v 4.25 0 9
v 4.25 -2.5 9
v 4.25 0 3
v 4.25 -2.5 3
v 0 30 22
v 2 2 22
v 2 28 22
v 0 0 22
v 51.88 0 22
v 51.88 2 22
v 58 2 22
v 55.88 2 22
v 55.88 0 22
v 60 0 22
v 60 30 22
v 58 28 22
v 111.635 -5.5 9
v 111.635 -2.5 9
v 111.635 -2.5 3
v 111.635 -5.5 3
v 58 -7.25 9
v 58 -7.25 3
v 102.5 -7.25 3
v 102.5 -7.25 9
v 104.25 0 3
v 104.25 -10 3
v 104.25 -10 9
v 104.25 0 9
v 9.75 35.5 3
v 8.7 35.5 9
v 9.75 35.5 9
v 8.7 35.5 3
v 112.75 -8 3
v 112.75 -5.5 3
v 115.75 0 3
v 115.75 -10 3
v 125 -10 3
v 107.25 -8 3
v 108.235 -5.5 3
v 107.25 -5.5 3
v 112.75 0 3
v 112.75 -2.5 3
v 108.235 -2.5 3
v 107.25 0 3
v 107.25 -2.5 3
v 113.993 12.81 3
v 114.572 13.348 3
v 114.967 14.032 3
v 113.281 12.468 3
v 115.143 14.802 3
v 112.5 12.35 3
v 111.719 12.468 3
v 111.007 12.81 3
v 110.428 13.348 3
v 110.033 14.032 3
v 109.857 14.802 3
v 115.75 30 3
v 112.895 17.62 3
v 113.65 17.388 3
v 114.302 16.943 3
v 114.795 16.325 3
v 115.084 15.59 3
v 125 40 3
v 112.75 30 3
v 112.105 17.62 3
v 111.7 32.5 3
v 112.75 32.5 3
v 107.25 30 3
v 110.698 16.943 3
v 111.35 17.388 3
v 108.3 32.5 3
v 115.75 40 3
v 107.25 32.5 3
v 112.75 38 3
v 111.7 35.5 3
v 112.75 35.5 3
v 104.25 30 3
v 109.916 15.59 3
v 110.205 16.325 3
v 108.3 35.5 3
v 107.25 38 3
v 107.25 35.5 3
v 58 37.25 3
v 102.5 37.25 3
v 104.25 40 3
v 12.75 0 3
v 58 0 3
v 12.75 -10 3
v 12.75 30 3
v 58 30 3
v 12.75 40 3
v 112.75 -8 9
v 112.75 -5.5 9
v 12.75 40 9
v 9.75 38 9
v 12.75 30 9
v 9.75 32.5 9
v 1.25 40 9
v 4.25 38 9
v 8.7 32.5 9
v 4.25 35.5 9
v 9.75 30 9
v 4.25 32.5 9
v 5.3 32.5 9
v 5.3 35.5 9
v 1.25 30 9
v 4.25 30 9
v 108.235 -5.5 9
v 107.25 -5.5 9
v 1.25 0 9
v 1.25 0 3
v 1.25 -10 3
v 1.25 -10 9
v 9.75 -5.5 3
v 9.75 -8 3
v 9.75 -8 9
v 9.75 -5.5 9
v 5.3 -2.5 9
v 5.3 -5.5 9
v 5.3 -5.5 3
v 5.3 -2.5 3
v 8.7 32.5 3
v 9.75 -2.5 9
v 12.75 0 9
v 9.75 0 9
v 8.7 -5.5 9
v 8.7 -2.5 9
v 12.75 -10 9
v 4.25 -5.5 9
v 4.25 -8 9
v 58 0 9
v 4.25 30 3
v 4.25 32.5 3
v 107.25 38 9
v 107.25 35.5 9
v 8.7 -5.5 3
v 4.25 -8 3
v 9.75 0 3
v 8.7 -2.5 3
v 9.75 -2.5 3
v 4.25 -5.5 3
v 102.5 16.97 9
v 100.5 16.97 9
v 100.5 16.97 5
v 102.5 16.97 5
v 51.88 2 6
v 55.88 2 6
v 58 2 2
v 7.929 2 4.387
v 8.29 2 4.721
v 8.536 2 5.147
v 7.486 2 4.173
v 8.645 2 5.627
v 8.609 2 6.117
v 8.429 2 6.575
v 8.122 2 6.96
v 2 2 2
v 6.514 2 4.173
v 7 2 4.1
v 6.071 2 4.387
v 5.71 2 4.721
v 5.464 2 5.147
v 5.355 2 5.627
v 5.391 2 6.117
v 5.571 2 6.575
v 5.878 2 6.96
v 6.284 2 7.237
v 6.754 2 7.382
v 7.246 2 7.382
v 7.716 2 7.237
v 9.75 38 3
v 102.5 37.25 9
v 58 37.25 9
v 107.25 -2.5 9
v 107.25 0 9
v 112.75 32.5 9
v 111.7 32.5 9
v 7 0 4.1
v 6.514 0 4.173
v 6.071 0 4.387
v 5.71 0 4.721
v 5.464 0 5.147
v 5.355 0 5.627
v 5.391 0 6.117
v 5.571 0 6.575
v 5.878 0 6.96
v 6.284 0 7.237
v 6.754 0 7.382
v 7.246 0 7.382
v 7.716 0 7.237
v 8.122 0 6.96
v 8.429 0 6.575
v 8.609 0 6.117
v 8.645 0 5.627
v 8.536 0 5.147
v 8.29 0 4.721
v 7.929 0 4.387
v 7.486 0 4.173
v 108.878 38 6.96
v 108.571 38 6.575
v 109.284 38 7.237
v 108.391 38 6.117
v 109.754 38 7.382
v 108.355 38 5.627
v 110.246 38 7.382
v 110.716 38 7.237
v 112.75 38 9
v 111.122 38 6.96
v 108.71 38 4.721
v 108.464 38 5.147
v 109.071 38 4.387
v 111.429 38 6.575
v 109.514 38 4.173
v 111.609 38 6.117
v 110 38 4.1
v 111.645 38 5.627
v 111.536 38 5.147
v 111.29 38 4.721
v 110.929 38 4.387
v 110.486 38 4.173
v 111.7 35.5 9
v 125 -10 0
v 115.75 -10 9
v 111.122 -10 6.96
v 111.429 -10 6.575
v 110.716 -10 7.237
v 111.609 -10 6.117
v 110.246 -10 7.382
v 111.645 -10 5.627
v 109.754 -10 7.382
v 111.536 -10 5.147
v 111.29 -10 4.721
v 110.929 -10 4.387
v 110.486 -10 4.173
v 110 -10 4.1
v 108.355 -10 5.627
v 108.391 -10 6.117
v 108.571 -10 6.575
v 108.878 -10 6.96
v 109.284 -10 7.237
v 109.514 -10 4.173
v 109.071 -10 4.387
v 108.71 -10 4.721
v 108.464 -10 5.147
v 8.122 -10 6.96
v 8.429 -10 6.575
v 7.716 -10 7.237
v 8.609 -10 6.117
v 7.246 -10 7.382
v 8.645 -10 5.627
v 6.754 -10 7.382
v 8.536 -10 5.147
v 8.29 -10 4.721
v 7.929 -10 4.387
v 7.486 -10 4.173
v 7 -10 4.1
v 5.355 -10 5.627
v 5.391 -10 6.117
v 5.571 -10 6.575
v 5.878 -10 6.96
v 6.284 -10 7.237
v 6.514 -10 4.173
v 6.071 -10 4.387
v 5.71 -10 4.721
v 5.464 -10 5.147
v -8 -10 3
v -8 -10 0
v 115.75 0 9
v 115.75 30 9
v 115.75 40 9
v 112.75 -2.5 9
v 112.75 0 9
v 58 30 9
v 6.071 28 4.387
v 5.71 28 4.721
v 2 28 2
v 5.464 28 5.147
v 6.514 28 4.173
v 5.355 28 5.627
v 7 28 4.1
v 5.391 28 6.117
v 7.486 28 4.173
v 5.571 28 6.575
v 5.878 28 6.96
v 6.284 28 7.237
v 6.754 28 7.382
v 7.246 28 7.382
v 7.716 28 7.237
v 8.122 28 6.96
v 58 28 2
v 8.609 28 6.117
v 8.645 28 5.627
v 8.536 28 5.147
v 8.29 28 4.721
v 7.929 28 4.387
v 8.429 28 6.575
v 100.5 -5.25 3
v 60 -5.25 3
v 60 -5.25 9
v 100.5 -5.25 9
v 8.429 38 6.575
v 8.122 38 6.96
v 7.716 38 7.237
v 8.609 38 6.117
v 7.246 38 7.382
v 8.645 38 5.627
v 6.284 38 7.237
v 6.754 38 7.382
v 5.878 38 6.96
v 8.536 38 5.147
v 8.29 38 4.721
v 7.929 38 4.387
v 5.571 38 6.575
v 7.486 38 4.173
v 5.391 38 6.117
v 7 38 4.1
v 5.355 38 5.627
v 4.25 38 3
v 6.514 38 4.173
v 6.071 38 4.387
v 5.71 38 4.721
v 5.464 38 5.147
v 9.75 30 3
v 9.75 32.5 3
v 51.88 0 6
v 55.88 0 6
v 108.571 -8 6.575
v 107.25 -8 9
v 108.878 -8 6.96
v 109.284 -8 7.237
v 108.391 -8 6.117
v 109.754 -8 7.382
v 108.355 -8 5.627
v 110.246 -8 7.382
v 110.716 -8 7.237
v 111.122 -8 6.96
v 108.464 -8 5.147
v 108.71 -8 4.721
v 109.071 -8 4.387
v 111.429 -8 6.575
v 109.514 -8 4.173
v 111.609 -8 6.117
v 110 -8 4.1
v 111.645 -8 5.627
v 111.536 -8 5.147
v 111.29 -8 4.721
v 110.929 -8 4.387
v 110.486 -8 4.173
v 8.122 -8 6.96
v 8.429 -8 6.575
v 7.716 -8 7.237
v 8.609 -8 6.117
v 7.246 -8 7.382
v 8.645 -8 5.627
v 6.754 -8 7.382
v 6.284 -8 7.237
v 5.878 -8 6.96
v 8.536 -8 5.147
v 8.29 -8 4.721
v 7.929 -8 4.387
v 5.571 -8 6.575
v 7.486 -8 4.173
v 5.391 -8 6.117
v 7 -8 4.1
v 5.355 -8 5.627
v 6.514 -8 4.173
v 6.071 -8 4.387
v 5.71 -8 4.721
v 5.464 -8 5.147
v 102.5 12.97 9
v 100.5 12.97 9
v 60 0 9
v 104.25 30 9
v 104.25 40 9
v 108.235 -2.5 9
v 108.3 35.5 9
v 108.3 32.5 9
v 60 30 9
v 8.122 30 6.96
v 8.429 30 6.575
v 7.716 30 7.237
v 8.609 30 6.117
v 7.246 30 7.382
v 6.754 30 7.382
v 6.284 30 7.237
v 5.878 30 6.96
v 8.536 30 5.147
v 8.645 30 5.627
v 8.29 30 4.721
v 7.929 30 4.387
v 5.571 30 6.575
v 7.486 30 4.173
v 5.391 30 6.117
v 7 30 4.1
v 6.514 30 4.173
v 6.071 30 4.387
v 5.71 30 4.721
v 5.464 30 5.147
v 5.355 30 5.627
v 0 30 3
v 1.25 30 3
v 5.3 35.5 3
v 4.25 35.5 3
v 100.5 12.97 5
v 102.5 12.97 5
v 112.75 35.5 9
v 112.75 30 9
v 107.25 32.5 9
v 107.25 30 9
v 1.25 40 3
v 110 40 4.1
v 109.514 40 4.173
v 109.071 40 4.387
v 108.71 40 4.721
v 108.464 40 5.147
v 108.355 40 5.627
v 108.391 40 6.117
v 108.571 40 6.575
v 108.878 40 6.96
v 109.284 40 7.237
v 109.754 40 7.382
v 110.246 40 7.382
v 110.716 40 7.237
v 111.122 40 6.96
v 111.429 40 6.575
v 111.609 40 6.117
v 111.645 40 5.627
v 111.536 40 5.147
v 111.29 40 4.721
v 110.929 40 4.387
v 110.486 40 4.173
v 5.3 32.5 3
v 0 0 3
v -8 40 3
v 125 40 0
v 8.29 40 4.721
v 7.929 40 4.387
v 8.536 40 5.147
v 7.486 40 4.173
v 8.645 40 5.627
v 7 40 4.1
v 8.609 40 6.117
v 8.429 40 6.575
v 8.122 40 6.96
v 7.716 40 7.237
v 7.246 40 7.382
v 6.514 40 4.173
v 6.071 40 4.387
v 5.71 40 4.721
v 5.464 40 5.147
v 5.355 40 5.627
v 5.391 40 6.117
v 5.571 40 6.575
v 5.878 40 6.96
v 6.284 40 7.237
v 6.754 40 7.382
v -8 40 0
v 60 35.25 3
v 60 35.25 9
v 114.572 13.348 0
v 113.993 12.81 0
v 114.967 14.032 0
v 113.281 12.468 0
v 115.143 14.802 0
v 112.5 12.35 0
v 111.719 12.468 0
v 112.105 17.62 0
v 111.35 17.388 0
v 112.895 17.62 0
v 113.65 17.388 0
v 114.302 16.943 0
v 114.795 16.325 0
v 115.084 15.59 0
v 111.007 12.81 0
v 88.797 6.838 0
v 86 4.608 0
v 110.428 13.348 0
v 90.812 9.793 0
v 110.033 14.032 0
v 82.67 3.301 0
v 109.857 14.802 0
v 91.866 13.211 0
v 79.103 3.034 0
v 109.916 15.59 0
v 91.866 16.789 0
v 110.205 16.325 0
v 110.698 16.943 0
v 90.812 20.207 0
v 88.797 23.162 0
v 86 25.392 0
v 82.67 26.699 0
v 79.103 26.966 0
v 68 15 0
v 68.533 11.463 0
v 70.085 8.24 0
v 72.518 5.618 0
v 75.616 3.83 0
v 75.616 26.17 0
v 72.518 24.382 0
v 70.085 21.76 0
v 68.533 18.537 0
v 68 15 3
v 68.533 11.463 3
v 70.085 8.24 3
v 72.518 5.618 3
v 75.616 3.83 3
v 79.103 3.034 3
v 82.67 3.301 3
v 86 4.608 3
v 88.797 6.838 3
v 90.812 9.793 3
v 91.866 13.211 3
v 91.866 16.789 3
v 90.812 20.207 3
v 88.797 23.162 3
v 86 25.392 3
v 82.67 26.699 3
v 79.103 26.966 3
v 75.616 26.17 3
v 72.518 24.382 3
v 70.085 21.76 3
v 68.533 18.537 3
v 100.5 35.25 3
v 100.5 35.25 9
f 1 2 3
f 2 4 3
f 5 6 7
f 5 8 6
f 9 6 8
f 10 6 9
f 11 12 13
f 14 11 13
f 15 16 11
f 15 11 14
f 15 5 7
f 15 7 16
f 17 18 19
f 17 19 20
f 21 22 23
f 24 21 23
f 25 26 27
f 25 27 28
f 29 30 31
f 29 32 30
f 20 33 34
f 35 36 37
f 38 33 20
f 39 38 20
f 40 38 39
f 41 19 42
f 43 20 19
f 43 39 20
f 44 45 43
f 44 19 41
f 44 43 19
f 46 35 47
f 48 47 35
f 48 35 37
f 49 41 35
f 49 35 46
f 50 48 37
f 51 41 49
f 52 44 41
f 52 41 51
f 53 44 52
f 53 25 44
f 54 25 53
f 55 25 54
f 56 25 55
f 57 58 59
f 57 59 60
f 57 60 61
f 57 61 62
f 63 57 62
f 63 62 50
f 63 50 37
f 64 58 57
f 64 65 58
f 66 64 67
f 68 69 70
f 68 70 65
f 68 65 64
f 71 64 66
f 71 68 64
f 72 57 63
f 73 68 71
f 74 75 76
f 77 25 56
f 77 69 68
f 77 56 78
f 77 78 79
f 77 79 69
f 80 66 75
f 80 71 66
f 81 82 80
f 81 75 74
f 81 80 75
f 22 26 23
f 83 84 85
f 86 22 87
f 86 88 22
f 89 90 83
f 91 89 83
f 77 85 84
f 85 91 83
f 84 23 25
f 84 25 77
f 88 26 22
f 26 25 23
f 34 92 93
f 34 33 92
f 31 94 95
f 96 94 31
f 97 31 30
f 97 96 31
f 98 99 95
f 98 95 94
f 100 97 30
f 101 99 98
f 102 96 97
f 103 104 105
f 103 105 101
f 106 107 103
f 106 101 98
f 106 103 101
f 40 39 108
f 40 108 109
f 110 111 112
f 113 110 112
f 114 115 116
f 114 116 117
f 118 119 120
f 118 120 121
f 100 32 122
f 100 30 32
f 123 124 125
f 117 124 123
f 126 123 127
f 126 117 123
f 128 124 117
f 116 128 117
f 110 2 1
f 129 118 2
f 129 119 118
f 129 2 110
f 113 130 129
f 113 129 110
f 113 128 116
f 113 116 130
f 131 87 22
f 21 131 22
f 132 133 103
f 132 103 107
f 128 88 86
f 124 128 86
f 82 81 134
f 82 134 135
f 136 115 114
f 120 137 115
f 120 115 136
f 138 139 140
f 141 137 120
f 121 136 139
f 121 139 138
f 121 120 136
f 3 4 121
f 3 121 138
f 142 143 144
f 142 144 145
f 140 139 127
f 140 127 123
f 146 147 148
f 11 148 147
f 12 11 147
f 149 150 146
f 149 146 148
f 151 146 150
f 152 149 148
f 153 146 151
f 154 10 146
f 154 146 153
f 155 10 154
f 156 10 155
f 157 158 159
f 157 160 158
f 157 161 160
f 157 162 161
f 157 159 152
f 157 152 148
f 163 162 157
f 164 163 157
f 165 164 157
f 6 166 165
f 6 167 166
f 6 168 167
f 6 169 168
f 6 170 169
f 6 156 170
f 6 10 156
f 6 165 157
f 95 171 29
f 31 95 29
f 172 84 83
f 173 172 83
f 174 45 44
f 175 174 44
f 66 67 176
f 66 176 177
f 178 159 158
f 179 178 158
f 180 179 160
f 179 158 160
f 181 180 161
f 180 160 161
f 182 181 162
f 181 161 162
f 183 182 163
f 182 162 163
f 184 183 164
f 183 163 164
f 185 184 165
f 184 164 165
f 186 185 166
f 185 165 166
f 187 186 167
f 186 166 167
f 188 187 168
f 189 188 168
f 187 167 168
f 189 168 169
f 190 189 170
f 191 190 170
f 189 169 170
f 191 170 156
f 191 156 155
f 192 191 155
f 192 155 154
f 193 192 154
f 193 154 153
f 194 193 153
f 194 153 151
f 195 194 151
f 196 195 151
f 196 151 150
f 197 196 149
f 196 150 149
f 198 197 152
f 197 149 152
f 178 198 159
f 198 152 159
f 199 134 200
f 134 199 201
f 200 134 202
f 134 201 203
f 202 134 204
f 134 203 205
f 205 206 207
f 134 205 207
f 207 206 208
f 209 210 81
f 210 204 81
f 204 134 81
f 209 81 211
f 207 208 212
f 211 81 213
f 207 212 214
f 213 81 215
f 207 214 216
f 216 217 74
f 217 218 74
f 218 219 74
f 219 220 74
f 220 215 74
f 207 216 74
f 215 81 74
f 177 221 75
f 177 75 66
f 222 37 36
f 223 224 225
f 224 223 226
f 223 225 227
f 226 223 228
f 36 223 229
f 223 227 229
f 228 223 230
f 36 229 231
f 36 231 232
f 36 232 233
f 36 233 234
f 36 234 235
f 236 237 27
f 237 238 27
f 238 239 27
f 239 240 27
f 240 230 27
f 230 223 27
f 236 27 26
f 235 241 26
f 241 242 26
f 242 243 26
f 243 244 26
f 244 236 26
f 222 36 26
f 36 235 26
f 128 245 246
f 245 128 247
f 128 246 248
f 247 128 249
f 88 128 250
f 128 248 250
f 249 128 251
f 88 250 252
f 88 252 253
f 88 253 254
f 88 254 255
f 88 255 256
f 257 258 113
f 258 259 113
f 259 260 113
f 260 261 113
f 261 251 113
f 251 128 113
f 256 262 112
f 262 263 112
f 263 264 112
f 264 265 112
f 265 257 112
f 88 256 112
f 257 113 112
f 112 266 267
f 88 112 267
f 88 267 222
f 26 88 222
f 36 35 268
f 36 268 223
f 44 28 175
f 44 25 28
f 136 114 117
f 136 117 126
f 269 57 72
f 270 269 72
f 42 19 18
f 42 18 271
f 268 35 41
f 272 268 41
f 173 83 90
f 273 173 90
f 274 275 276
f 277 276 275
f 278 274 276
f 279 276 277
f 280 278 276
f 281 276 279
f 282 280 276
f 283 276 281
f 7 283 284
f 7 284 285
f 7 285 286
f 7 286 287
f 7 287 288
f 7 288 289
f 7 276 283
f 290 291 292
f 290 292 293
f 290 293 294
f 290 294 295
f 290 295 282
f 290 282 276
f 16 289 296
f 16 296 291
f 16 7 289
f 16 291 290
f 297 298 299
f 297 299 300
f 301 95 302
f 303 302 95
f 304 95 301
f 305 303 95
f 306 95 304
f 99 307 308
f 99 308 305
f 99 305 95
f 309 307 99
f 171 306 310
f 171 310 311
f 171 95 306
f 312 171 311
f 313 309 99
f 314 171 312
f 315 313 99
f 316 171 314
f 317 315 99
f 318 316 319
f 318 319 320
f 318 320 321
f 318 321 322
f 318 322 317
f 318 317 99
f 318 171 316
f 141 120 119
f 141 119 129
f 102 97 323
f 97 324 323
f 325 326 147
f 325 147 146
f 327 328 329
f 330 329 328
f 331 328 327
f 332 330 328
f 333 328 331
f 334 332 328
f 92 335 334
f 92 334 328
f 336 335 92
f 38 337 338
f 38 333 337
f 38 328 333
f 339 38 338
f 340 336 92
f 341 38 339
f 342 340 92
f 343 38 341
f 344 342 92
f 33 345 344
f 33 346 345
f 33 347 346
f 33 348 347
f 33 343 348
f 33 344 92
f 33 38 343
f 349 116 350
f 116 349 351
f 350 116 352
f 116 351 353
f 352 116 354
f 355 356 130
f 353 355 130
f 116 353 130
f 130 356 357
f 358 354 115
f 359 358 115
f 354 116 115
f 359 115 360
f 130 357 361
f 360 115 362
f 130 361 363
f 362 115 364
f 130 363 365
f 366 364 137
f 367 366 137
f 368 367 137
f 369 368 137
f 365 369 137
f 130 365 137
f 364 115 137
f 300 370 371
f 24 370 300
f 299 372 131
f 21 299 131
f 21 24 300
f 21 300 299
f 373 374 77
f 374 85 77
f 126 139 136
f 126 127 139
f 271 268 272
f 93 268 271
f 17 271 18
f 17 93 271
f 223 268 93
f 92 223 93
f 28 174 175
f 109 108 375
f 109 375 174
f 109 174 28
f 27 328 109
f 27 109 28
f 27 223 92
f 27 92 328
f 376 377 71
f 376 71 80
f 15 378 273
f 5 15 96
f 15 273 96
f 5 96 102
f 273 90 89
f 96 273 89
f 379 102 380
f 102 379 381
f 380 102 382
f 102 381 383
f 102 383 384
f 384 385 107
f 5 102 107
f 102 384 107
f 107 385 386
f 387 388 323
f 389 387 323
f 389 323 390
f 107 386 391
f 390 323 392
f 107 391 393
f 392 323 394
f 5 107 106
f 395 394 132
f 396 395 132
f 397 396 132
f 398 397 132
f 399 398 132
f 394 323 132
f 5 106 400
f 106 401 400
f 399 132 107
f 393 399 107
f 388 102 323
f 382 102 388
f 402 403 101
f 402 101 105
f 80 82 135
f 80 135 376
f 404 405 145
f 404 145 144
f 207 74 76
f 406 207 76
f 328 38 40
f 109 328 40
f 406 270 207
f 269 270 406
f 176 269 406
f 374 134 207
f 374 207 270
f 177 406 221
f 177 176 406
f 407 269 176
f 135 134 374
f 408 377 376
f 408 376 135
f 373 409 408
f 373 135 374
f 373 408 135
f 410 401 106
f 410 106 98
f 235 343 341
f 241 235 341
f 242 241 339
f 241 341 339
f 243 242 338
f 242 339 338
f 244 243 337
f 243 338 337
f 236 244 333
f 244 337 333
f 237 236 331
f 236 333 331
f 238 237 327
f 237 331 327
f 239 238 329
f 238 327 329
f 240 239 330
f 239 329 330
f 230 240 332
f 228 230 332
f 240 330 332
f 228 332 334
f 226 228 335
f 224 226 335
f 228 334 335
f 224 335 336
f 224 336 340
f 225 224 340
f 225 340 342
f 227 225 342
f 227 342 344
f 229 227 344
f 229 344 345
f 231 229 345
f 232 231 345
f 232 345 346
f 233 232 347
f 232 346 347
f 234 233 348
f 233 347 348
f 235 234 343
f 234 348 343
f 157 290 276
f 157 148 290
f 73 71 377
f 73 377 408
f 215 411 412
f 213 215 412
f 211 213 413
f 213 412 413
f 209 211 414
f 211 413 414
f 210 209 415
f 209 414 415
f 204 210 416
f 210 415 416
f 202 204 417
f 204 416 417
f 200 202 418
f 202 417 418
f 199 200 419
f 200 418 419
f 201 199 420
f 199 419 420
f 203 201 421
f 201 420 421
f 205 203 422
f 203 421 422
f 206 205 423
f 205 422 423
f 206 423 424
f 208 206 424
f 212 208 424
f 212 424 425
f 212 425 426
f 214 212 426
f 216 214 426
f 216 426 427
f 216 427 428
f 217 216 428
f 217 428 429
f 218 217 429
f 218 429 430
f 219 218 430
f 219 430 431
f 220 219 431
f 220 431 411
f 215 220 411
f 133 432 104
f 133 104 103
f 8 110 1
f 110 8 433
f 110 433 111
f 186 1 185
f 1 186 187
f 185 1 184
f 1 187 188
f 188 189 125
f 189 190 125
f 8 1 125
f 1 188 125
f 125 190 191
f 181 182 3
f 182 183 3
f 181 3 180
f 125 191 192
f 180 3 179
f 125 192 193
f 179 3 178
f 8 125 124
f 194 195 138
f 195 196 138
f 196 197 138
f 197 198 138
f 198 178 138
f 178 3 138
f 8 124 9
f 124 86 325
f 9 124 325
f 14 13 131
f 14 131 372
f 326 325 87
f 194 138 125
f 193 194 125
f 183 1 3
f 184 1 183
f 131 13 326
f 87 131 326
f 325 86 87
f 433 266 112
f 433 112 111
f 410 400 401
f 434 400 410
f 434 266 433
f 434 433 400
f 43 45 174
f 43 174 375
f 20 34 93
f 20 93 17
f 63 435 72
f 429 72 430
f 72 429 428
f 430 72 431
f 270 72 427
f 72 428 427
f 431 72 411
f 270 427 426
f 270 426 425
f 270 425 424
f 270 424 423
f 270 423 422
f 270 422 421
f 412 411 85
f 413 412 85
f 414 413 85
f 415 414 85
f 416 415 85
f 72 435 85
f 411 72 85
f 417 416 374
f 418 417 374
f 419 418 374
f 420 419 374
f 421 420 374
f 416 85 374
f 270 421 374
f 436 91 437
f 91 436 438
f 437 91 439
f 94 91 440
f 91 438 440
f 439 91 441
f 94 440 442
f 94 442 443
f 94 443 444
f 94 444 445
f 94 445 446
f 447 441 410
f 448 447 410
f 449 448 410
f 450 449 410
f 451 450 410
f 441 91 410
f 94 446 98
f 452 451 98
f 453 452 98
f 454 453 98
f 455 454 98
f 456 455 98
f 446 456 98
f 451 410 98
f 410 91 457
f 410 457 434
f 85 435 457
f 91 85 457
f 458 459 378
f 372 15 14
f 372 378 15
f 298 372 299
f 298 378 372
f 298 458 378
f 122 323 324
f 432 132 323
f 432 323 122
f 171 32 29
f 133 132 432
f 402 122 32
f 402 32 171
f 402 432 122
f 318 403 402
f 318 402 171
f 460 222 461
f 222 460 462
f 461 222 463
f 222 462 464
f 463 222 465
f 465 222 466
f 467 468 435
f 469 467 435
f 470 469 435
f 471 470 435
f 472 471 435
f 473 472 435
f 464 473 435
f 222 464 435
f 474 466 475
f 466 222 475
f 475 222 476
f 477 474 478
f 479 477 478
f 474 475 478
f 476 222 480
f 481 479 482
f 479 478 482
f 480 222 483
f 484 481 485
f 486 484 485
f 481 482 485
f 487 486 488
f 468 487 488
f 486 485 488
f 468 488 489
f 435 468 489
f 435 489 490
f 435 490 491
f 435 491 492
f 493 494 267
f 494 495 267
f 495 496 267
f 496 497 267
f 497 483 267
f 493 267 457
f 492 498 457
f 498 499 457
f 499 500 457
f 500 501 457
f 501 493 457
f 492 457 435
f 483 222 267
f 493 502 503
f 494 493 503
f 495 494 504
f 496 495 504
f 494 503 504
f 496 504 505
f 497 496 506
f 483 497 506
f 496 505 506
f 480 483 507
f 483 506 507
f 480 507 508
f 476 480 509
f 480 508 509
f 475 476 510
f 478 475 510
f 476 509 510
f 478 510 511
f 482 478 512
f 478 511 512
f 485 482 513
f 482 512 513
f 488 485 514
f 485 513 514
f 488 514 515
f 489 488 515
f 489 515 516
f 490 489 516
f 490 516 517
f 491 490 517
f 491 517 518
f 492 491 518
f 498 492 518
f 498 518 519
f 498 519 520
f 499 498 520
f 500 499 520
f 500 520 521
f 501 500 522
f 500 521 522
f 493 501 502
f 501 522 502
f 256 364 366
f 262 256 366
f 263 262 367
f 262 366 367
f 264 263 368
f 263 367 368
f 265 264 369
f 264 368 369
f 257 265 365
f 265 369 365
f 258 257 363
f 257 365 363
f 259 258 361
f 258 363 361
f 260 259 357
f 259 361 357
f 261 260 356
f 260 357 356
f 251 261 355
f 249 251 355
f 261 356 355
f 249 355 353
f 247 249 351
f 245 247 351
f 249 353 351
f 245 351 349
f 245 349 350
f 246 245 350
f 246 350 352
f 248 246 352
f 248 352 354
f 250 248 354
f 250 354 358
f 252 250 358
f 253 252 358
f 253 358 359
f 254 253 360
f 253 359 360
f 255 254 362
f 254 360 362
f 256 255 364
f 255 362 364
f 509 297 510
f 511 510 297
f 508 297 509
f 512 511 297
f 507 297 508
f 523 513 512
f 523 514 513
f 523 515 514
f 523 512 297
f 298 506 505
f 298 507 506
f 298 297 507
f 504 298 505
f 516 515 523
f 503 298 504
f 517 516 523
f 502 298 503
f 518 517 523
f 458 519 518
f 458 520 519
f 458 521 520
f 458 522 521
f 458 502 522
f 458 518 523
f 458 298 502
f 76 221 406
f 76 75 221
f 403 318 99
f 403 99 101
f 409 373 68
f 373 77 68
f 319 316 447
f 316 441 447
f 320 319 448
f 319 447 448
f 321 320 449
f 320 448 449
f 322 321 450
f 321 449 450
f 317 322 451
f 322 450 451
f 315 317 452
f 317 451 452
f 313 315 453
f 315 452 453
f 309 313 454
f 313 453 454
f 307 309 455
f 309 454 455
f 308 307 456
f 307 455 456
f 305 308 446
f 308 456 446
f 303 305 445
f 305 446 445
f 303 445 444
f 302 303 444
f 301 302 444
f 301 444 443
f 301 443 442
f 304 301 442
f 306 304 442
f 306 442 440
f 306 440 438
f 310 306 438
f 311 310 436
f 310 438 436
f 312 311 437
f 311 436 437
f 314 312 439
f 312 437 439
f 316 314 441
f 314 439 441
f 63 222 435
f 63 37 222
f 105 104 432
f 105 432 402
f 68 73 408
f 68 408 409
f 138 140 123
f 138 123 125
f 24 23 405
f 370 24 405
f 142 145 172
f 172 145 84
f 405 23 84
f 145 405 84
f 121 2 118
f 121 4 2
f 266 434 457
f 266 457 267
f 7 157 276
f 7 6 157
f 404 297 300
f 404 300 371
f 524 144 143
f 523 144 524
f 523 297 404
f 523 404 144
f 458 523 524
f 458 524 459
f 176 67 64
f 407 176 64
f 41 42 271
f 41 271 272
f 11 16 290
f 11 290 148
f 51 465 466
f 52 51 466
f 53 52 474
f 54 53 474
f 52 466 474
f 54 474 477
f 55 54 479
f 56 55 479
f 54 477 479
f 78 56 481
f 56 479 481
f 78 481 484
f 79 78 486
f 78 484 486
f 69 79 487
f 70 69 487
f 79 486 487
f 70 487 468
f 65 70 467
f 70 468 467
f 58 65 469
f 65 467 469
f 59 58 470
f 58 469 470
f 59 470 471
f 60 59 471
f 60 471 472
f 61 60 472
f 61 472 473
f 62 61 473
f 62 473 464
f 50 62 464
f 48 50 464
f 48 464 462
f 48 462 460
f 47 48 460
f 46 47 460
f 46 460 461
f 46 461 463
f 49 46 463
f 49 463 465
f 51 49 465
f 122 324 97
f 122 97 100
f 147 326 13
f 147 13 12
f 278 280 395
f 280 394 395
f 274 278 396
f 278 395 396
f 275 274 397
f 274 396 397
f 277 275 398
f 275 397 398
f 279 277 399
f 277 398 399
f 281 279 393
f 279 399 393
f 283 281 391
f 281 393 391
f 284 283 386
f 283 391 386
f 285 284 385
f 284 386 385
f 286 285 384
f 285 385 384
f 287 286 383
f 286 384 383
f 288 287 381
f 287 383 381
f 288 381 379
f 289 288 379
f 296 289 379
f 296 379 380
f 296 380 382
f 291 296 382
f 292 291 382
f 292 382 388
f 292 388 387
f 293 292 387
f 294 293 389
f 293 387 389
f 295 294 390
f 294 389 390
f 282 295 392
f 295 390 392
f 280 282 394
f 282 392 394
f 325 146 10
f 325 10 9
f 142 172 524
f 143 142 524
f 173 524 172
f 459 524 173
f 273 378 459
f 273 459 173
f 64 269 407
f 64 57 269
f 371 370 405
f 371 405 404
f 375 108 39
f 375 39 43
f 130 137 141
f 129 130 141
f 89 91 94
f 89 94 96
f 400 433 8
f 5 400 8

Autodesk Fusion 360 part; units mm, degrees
sketch "Sketch1" plane through (0, 0, 0) normal (0, 0, 1) x (1, 0, 0)
  line L0 (0, 0) -> (60, 0)
  line L1 (60, 0) -> (60, 30)
  line L2 (60, 30) -> (0, 30)
  line L3 (0, 30) -> (0, 0)
  dimension "d1" = 60
  dimension "d2" = 30
extrude "Extrude1" add sketch "Sketch1" along normal blind 22
sketch "Sketch2" plane through (0, 0, 22) normal (0, 0, 1) x (-1, 0, 0)
  line L0 (0, -30) -> (0, 0)
  line L1 (0, 0) -> (-60, 0)
  line L2 (-60, 0) -> (-60, -30)
  line L3 (-60, -30) -> (0, -30)
  line L4 (-2, -28) -> (-58, -28)
  line L5 (-58, -28) -> (-58, -2)
  line L6 (-58, -2) -> (-2, -2)
  line L7 (-2, -2) -> (-2, -28)
  dimension "d5" = 56
  dimension "d6" = 26
  dimension "d7" = 2
  dimension "d8" = 2
extrude "Extrude2" cut sketch "Sketch2" against normal blind 20 contours L4 L5 L6 L7
sketch "Sketch3" plane through (0, 0, 0) normal (0, -1, 0) x (1, 0, 0)
  line L0 (0, 0) -> (60, 0)
  line L1 (60, 0) -> (60, 22)
  line L2 (60, 22) -> (0, 22)
  line L3 (0, 22) -> (0, 0)
  line L4 (0, 0) -> (60, 0)
  line L5 (60, 0) -> (60, 3)
  line L6 (60, 3) -> (0, 3)
  line L7 (0, 3) -> (0, 0)
  dimension "d11" = 60
  dimension "d12" = 3
extrude "Extrude3" add sketch "Sketch3" along normal blind 8 contours L0 L1 L3 L4 L5 L6 L7
sketch "Sketch4" plane through (0, 30, 0) normal (0, 1, 0) x (-1, 0, 0)
  line L0 (-60, 0) -> (0, 0)
  line L1 (0, 0) -> (0, 22)
  line L2 (0, 22) -> (-60, 22)
  line L3 (-60, 22) -> (-60, 0)
  line L4 (-60, 0) -> (0, 0)
  line L5 (0, 0) -> (0, 3)
  line L6 (0, 3) -> (-60, 3)
  line L7 (-60, 3) -> (-60, 0)
  dimension "d15" = 3
extrude "Extrude4" add sketch "Sketch4" along normal blind 8 contours L0 L1 L3 L4 L5 L6 L7
sketch "Sketch5" plane through (60, 0, 0) normal (1, 0, 0) x (0, 1, 0)
  line L0 (-8, 0) -> (38, 0)
  line L1 (38, 0) -> (38, 3)
  line L2 (38, 3) -> (30, 3)
  line L3 (30, 3) -> (30, 22)
  line L4 (30, 22) -> (0, 22)
  line L5 (0, 22) -> (0, 3)
  line L6 (0, 3) -> (-8, 3)
  line L7 (-8, 3) -> (-8, 0)
  line L8 (-8, 3) -> (38, 3)
  line L9 (38, 3) -> (38, 0)
  line L10 (38, 0) -> (-8, 0)
  line L11 (-8, 0) -> (-8, 3)
extrude "Extrude5" add sketch "Sketch5" along normal blind 50 contours L0 L1 L2 L6 L7 L8 L9 L10 L11
sketch "Sketch6" plane through (0, 0, 0) normal (-1, 0, 0) x (0, -1, 0)
  line L0 (-38, 0) -> (8, 0)
  line L1 (8, 0) -> (8, 3)
  line L2 (8, 3) -> (0, 3)
  line L3 (0, 3) -> (0, 22)
  line L4 (0, 22) -> (-30, 22)
  line L5 (-30, 22) -> (-30, 3)
  line L6 (-30, 3) -> (-38, 3)
  line L7 (-38, 3) -> (-38, 0)
  line L8 (-38, 3) -> (8, 3)
  line L9 (8, 3) -> (8, 0)
  line L10 (8, 0) -> (-38, 0)
  line L11 (-38, 0) -> (-38, 3)
extrude "Extrude6" add sketch "Sketch6" along normal blind 8 contours L0 L1 L2 L6 L7 L8 L9 L10 L11
sketch "Sketch7" plane through (0, 0, 3) normal (0, 0, 1) x (-1, 0, 0)
  line L0 (8, 8) -> (-110, 8)
  line L1 (-110, 8) -> (-110, -38)
  line L2 (-110, -38) -> (8, -38)
  line L3 (8, -38) -> (8, 8)
  line L4 (0, 0) -> (0, -30)
  line L5 (0, -30) -> (-60, -30)
  line L6 (-60, -30) -> (-60, 0)
  line L7 (-60, 0) -> (0, 0)
  line L8 (-60.1, -35.15) -> (-100.4, -35.15) construction
  line L9 (-100.4, -35.15) -> (-100.4, 5.15) construction
  line L10 (-100.4, 5.15) -> (-60.1, 5.15) construction
  line L11 (-60.1, 5.15) -> (-60.1, -35.15) construction
  line L12 (-60, -15) -> (-127.1, -15) construction
  line L13 (-100.5, -35.25) -> (-60, -35.25)
  line L14 (-60, -35.25) -> (-60, 5.25)
  line L15 (-60, 5.25) -> (-100.5, 5.25)
  line L16 (-100.5, 5.25) -> (-100.5, -35.25)
  line L17 (-58, -37.25) -> (-58, 7.25)
  line L18 (-58, 7.25) -> (-102.5, 7.25)
  line L19 (-102.5, 7.25) -> (-102.5, -37.25)
  line L20 (-102.5, -37.25) -> (-58, -37.25)
  dimension "d22" = 40.3
  dimension "d23" = 40.3
  dimension "d24" = 20.15
  dimension "d25" = 0.1
  dimension "d31" = 40.5
  dimension "d32" = 40.5
  dimension "d33" = 68
  dimension "d34" = 20.25
  dimension "d35" = 2
move_face "OffsetFaces1" offset 2 1 faces at (70.6667, 38, 2)
extrude "Extrude7" add 1 faces at (31.3333, -8, 2) along direction (0, -1, 0) blind 2
extrude "Extrude8" add 1 faces at (110, 23.3333, 1) along direction (1, 0, 0) blind 15
extrude "Extrude9" add sketch "Sketch7" along normal blind 6 contours L5 L7 L13 L14 L15 L16 L17 L18 L19 L20
sketch "Sketch9" plane through (0, 0, 3) normal (0, 0, 1) x (-1, 0, 0)
  line L0 (-60, -35.25) -> (-60, 5.25)
  line L1 (-60, 5.25) -> (-100.5, 5.25)
  line L2 (-100.5, 5.25) -> (-100.5, -35.25)
  line L3 (-100.5, -35.25) -> (-60, -35.25)
  circle A0 centre (-80, -15) radius 12
  dimension "d38" = 24
extrude "Extrude10" cut sketch "Sketch9" against normal blind 12 contours A0
sketch "Sketch10" plane through (0, 0, 9) normal (0, 0, 1) x (-1, 0, 0)
  line L0 (-60, 0) -> (-58, 0)
  line L1 (-58, 0) -> (-58, 7.25)
  line L2 (-58, 7.25) -> (-102.5, 7.25)
  line L3 (-102.5, 7.25) -> (-102.5, -37.25)
  line L4 (-102.5, -37.25) -> (-58, -37.25)
  line L5 (-58, -37.25) -> (-58, -30)
  line L6 (-58, -30) -> (-60, -30)
  line L7 (-60, -30) -> (-60, -35.25)
  line L8 (-60, -35.25) -> (-100.5, -35.25)
  line L9 (-100.5, -35.25) -> (-100.5, 5.25)
  line L10 (-100.5, 5.25) -> (-60, 5.25)
  line L11 (-60, 5.25) -> (-60, 0)
  line L12 (-100.5, -16.9697) -> (-102.5, -16.9697)
  line L13 (-102.5, -16.9697) -> (-102.5, -12.9697)
  line L14 (-102.5, -12.9697) -> (-100.5, -12.9697)
  line L15 (-100.5, -12.9697) -> (-100.5, -16.9697)
  line L16 (-110, -14.9697) -> (-85, -14.9697) construction
  dimension "d41" = 2
  dimension "d42" = 4
  dimension "d43" = 2
extrude "Extrude11" cut sketch "Sketch10" against normal blind 4 contours L3 L9 L12 L13 L14 L15
sketch "Sketch11" plane through (0, 0, 22) normal (0, 0, 1) x (-1, 0, 0)
  line L0 (-58, -28) -> (-58, -2)
  line L1 (-58, -2) -> (-2, -2)
  line L2 (-2, -2) -> (-2, -28)
  line L3 (-2, -28) -> (-58, -28)
  line L4 (0, -30) -> (0, 0)
  line L5 (0, 0) -> (-60, 0)
  line L6 (-60, 0) -> (-60, -30)
  line L7 (-60, -30) -> (0, -30)
  line L8 (-55.8802, -2) -> (-51.8802, -2)
  line L9 (-51.8802, -2) -> (-51.8802, 0)
  line L10 (-51.8802, 0) -> (-55.8802, 0)
  line L11 (-55.8802, 0) -> (-55.8802, -2)
  dimension "d46" = 4
extrude "Extrude12" cut sketch "Sketch11" against normal blind 16 contours L1 L5 L8 L9 L10 L11
sketch "Sketch12" plane through (0, 0, 3) normal (0, 0, 1) x (-1, 0, 0)
  line L0 (-58, -30) -> (-58, -37.25)
  line L1 (-58, -37.25) -> (-102.5, -37.25)
  line L2 (-102.5, -37.25) -> (-102.5, 7.25)
  line L3 (-102.5, 7.25) -> (-58, 7.25)
  line L4 (-58, 7.25) -> (-58, 0)
  line L5 (-58, 0) -> (0, 0)
  line L6 (0, 0) -> (0, -30)
  line L7 (0, -30) -> (-58, -30)
  line L8 (-125, -40) -> (8, -40)
  line L9 (8, -40) -> (8, 10)
  line L10 (8, 10) -> (-125, 10)
  line L11 (-125, 10) -> (-125, -40)
  line L12 (-7, -44) -> (-7, 24) construction
  line L13 (-110, -45) -> (-110, 22) construction
  line L14 (-1.25, -30) -> (-1.25, -40)
  line L15 (-1.25, -40) -> (-12.75, -40)
  line L16 (-12.75, -40) -> (-12.75, -30)
  line L17 (-12.75, -30) -> (-9.75, -30)
  line L18 (-9.75, -38) -> (-4.25, -38)
  line L19 (-4.25, -38) -> (-4.25, -30)
  line L20 (-1.25, -30) -> (-4.25, -30)
  line L21 (-9.75, -38) -> (-9.75, -30)
  line L22 (-28.0187, -15) -> (31, -15) construction
  line L23 (-12.75, 0) -> (-9.75, 0)
  line L24 (-12.75, 10) -> (-12.75, 0)
  line L25 (-9.75, 8) -> (-9.75, 0)
  line L26 (-9.75, 8) -> (-4.25, 8)
  line L27 (-4.25, 8) -> (-4.25, 0)
  line L28 (-1.25, 0) -> (-4.25, 0)
  line L29 (-1.25, 0) -> (-1.25, 10)
  line L30 (-1.25, 10) -> (-12.75, 10)
  line L31 (-58.5, 15) -> (-58.5, -52) construction
  line L32 (-104.25, 10) -> (-104.25, 0)
  line L33 (-115.75, 10) -> (-104.25, 10)
  line L34 (-107.25, 8) -> (-112.75, 8)
  line L35 (-107.25, 8) -> (-107.25, 0)
  line L36 (-112.75, 8) -> (-112.75, 0)
  line L37 (-115.75, 0) -> (-115.75, 10)
  line L38 (-115.75, 0) -> (-112.75, 0)
  line L39 (-104.25, 0) -> (-107.25, 0)
  line L40 (-104.25, -30) -> (-107.25, -30)
  line L41 (-107.25, -38) -> (-107.25, -30)
  line L42 (-112.75, -38) -> (-112.75, -30)
  line L43 (-115.75, -30) -> (-112.75, -30)
  line L44 (-115.75, -30) -> (-115.75, -40)
  line L45 (-107.25, -38) -> (-112.75, -38)
  line L46 (-115.75, -40) -> (-104.25, -40)
  line L47 (-104.25, -40) -> (-104.25, -30)
  dimension "d49" = 15
  dimension "d50" = 15
  dimension "d51" = 2.75
  dimension "d52" = 2.75
  dimension "d53" = 3
  dimension "d54" = 3
  dimension "d55" = 2
  dimension "d56" = 66.5
extrude "Extrude13" add sketch "Sketch12" along normal blind 6 contours L7 L8 L14 L15 L16 L17 L18 L19 L20 L21 | L8 L40 L41 L42 L43 L44 L45 L46 L47 | L5 L10 L23 L24 L25 L26 L27 L28 L29 L30 | L10 L32 L33 L34 L35 L36 L37 L38 L39
sketch "Sketch13" plane through (0, -10, 0) normal (0, -1, 0) x (1, 0, 0)
  line L0 (-8, 0) -> (125, 0)
  line L1 (125, 0) -> (125, 3)
  line L2 (125, 3) -> (115.75, 3)
  line L3 (115.75, 3) -> (115.75, 9)
  line L4 (115.75, 9) -> (104.25, 9)
  line L5 (104.25, 9) -> (104.25, 3)
  line L6 (104.25, 3) -> (12.75, 3)
  line L7 (12.75, 3) -> (12.75, 9)
  line L8 (12.75, 9) -> (1.25, 9)
  line L9 (1.25, 9) -> (1.25, 3)
  line L10 (1.25, 3) -> (-8, 3)
  line L11 (-8, 3) -> (-8, 0)
  line L12 (104.25, 3) -> (115.75, 3) construction
  line L13 (103, 8.5) -> (117.6026, 8.5) construction
  line L14 (104.25, 8.5) -> (115.75, 3) construction
  line L15 (115.75, 8.5) -> (104.25, 3) construction
  line L16 (1.25, 3) -> (12.75, 3) construction
  line L17 (-3, 8.5) -> (20, 8.5) construction
  line L18 (1.25, 8.5) -> (12.75, 3) construction
  line L19 (12.75, 8.5) -> (1.25, 3) construction
  point P0 (110, 5.75)
  point P1 (7, 5.75)
  dimension "d59" = 5.5
  dimension "d60" = 5.5
hole "Hole1" at (7, -10, 5.75) at (110, -10, 5.75) direction (0, 1, 0) diameter 3.3 depth 100 tip angle 118
sketch "Sketch14" plane through (0, 0, 3) normal (0, 0, 1) x (-1, 0, 0)
  line L0 (-9.75, -30) -> (-9.75, -38)
  line L1 (-9.75, -38) -> (-4.25, -38)
  line L2 (-4.25, -38) -> (-4.25, -30)
  line L3 (-4.25, -30) -> (-9.75, -30)
  line L4 (-4.25, -35.5) -> (-9.75, -35.5)
  line L5 (-9.75, -35.5) -> (-9.75, -32.5)
  line L6 (-9.75, -32.5) -> (-4.25, -32.5)
  line L7 (-4.25, -32.5) -> (-4.25, -35.5)
  dimension "d64" = 3
  dimension "d65" = 2.5
extrude "Extrude14" add sketch "Sketch14" along normal blind 6 contours L0 L2 L4 L5 L6 L7
sketch "Sketch15" plane through (0, 0, 9) normal (0, 0, 1) x (-1, 0, 0)
  line L0 (-4.25, -35.5) -> (-4.25, -38)
  line L1 (-4.25, -38) -> (-9.75, -38)
  line L2 (-9.75, -38) -> (-9.75, -35.5)
  line L3 (-9.75, -35.5) -> (-4.25, -35.5)
  line L4 (-4.25, -32.5) -> (-9.75, -32.5)
  line L5 (-9.75, -32.5) -> (-9.75, -30)
  line L6 (-9.75, -30) -> (-12.75, -30)
  line L7 (-12.75, -30) -> (-12.75, -40)
  line L8 (-12.75, -40) -> (-1.25, -40)
  line L9 (-1.25, -40) -> (-1.25, -30)
  line L10 (-1.25, -30) -> (-4.25, -30)
  line L11 (-4.25, -30) -> (-4.25, -32.5)
  line L12 (-7, -25.2955) -> (-7, -46) construction
  line L13 (-5.3, -35.5) -> (-8.7, -35.5)
  line L14 (-8.7, -35.5) -> (-8.7, -32.5)
  line L15 (-8.7, -32.5) -> (-5.3, -32.5)
  line L16 (-5.3, -32.5) -> (-5.3, -35.5)
  dimension "d68" = 3.4
  dimension "d69" = 1.7
  dimension "d70" = 5.75
extrude "Extrude15" cut sketch "Sketch15" against normal blind 6 contours L3 L4 L13 L14 L15 L16
sketch "Sketch16" plane through (0, 0, 3) normal (0, 0, 1) x (-1, 0, 0)
  line L0 (-9.75, 8) -> (-9.75, 0)
  line L1 (-9.75, 0) -> (-4.25, 0)
  line L2 (-4.25, 0) -> (-4.25, 8)
  line L3 (-4.25, 8) -> (-9.75, 8)
  line L4 (-7, 2) -> (-7, 16) construction
  line L5 (-1.25, 0) -> (-1.25, 10) construction
  line L6 (-4.25, 2.5) -> (-9.75, 2.5)
  line L7 (-9.75, 2.5) -> (-9.75, 5.5)
  line L8 (-9.75, 5.5) -> (-4.25, 5.5)
  line L9 (-4.25, 5.5) -> (-4.25, 2.5)
  dimension "d73" = 5.75
  dimension "d74" = 3
  dimension "d75" = 2.5
extrude "Extrude16" add sketch "Sketch16" along normal blind 6 contours L0 L2 L6 L7 L8 L9
sketch "Sketch17" plane through (0, 0, 9) normal (0, 0, 1) x (-1, 0, 0)
  line L0 (-4.25, 2.5) -> (-4.25, 0)
  line L1 (-4.25, 0) -> (-1.25, 0)
  line L2 (-1.25, 0) -> (-1.25, 10)
  line L3 (-1.25, 10) -> (-12.75, 10)
  line L4 (-12.75, 10) -> (-12.75, 0)
  line L5 (-12.75, 0) -> (-9.75, 0)
  line L6 (-9.75, 0) -> (-9.75, 2.5)
  line L7 (-9.75, 2.5) -> (-4.25, 2.5)
  line L8 (-4.25, 5.5) -> (-9.75, 5.5)
  line L9 (-9.75, 5.5) -> (-9.75, 8)
  line L10 (-9.75, 8) -> (-4.25, 8)
  line L11 (-4.25, 8) -> (-4.25, 5.5)
  line L12 (-7, 1) -> (-7, 15) construction
  line L13 (-5.3, 2.5) -> (-8.7, 2.5)
  line L14 (-8.7, 2.5) -> (-8.7, 5.5)
  line L15 (-8.7, 5.5) -> (-5.3, 5.5)
  line L16 (-5.3, 5.5) -> (-5.3, 2.5)
  dimension "d78" = 5.75
  dimension "d79" = 3.4
  dimension "d80" = 1.7
extrude "Extrude17" cut sketch "Sketch17" against normal blind 6 contours L7 L8 L13 L14 L15 L16
sketch "Sketch18" plane through (0, 0, 3) normal (0, 0, 1) x (-1, 0, 0)
  line L0 (-12.75, -40) -> (-12.75, -30)
  line L1 (-12.75, -30) -> (-58, -30)
  line L2 (-58, -30) -> (-58, -37.25)
  line L3 (-58, -37.25) -> (-102.5, -37.25)
  line L4 (-102.5, -37.25) -> (-102.5, 7.25)
  line L5 (-102.5, 7.25) -> (-58, 7.25)
  line L6 (-58, 7.25) -> (-58, 0)
  line L7 (-58, 0) -> (-12.75, 0)
  line L8 (-12.75, 0) -> (-12.75, 10)
  line L9 (-12.75, 10) -> (-104.25, 10)
  line L10 (-104.25, 10) -> (-104.25, 0)
  line L11 (-104.25, 0) -> (-107.25, 0)
  line L12 (-107.25, 0) -> (-107.25, 8)
  line L13 (-107.25, 8) -> (-112.75, 8)
  line L14 (-112.75, 8) -> (-112.75, 0)
  line L15 (-112.75, 0) -> (-115.75, 0)
  line L16 (-115.75, 0) -> (-115.75, 10)
  line L17 (-115.75, 10) -> (-125, 10)
  line L18 (-125, 10) -> (-125, -40)
  line L19 (-125, -40) -> (-115.75, -40)
  line L20 (-115.75, -40) -> (-115.75, -30)
  line L21 (-115.75, -30) -> (-112.75, -30)
  line L22 (-112.75, -30) -> (-112.75, -38)
  line L23 (-112.75, -38) -> (-107.25, -38)
  line L24 (-107.25, -38) -> (-107.25, -30)
  line L25 (-107.25, -30) -> (-104.25, -30)
  line L26 (-104.25, -30) -> (-104.25, -40)
  line L27 (-104.25, -40) -> (-12.75, -40)
  line L28 (-107.25, -35.5) -> (-112.75, -35.5)
  line L29 (-112.75, -35.5) -> (-112.75, -32.5)
  line L30 (-112.75, -32.5) -> (-107.25, -32.5)
  line L31 (-107.25, -32.5) -> (-107.25, -35.5)
  line L32 (-107.25, 2.5) -> (-112.75, 2.5)
  line L33 (-112.75, 2.5) -> (-112.75, 5.5)
  line L34 (-112.75, 5.5) -> (-107.25, 5.5)
  line L35 (-107.25, 5.5) -> (-107.25, 2.5)
  dimension "d83" = 3
  dimension "d84" = 3
  dimension "d85" = 2.5
  dimension "d86" = 2.5
extrude "Extrude18" add sketch "Sketch18" along normal blind 6 contours L22 L24 L28 L29 L30 L31 | L12 L14 L32 L33 L34 L35
sketch "Sketch19" plane through (0, 0, 9) normal (0, 0, 1) x (-1, 0, 0)
  line L0 (-112.75, -32.5) -> (-112.75, -30)
  line L1 (-112.75, -30) -> (-115.75, -30)
  line L2 (-115.75, -30) -> (-115.75, -40)
  line L3 (-115.75, -40) -> (-104.25, -40)
  line L4 (-104.25, -40) -> (-104.25, -30)
  line L5 (-104.25, -30) -> (-107.25, -30)
  line L6 (-107.25, -30) -> (-107.25, -32.5)
  line L7 (-107.25, -32.5) -> (-112.75, -32.5)
  line L8 (-112.75, -35.5) -> (-107.25, -35.5)
  line L9 (-107.25, -35.5) -> (-107.25, -38)
  line L10 (-107.25, -38) -> (-112.75, -38)
  line L11 (-112.75, -38) -> (-112.75, -35.5)
  line L12 (-108.3, -35.5) -> (-111.7, -35.5)
  line L13 (-111.7, -35.5) -> (-111.7, -32.5)
  line L14 (-111.7, -32.5) -> (-108.3, -32.5)
  line L15 (-108.3, -32.5) -> (-108.3, -35.5)
  line L16 (-110, -40.7377) -> (-110, -29.5) construction
  dimension "d89" = 3.4
  dimension "d90" = 5.75
  dimension "d91" = 1.7
extrude "Extrude19" cut sketch "Sketch19" against normal blind 6 contours L7 L8 L12 L13 L14 L15
sketch "Sketch20" plane through (0, 0, 9) normal (0, 0, 1) x (-1, 0, 0)
  line L0 (-112.75, 5.5) -> (-112.75, 8)
  line L1 (-112.75, 8) -> (-107.25, 8)
  line L2 (-107.25, 8) -> (-107.25, 5.5)
  line L3 (-107.25, 5.5) -> (-112.75, 5.5)
  line L4 (-112.75, 2.5) -> (-107.25, 2.5)
  line L5 (-107.25, 2.5) -> (-107.25, 0)
  line L6 (-107.25, 0) -> (-104.25, 0)
  line L7 (-104.25, 0) -> (-104.25, 10)
  line L8 (-104.25, 10) -> (-115.75, 10)
  line L9 (-115.75, 10) -> (-115.75, 0)
  line L10 (-115.75, 0) -> (-112.75, 0)
  line L11 (-112.75, 0) -> (-112.75, 2.5)
  line L12 (-108.2353, 2.5) -> (-111.6353, 2.5)
  line L13 (-111.6353, 2.5) -> (-111.6353, 5.5)
  line L14 (-111.6353, 5.5) -> (-108.2353, 5.5)
  line L15 (-108.2353, 5.5) -> (-108.2353, 2.5)
  line L16 (-109.9353, -2) -> (-109.9353, 11) construction
  dimension "d94" = 3.4
  dimension "d95" = 1.7
extrude "Extrude20" cut sketch "Sketch20" against normal blind 6 contours L3 L4 L12 L13 L14 L15
sketch "Sketch21" plane through (0, 0, 3) normal (0, 0, 1) x (-1, 0, 0)
  line L0 (-107.25, -35.5) -> (-108.3, -35.5)
  line L1 (-108.3, -35.5) -> (-108.3, -32.5)
  line L2 (-108.3, -32.5) -> (-107.25, -32.5)
  line L3 (-107.25, -32.5) -> (-107.25, -30)
  line L4 (-107.25, -30) -> (-104.25, -30)
  line L5 (-104.25, -30) -> (-104.25, -40)
  line L6 (-104.25, -40) -> (-12.75, -40)
  line L7 (-12.75, -40) -> (-12.75, -30)
  line L8 (-12.75, -30) -> (-58, -30)
  line L9 (-58, -30) -> (-58, -37.25)
  line L10 (-58, -37.25) -> (-102.5, -37.25)
  line L11 (-102.5, -37.25) -> (-102.5, 7.25)
  line L12 (-102.5, 7.25) -> (-58, 7.25)
  line L13 (-58, 7.25) -> (-58, 0)
  line L14 (-58, 0) -> (-12.75, 0)
  line L15 (-12.75, 0) -> (-12.75, 10)
  line L16 (-12.75, 10) -> (-104.25, 10)
  line L17 (-104.25, 10) -> (-104.25, 0)
  line L18 (-104.25, 0) -> (-107.25, 0)
  line L19 (-107.25, 0) -> (-107.25, 2.5)
  line L20 (-107.25, 2.5) -> (-108.2353, 2.5)
  line L21 (-108.2353, 2.5) -> (-108.2353, 5.5)
  line L22 (-108.2353, 5.5) -> (-107.25, 5.5)
  line L23 (-107.25, 5.5) -> (-107.25, 8)
  line L24 (-107.25, 8) -> (-112.75, 8)
  line L25 (-112.75, 8) -> (-112.75, 5.5)
  line L26 (-112.75, 5.5) -> (-111.6353, 5.5)
  line L27 (-111.6353, 5.5) -> (-111.6353, 2.5)
  line L28 (-111.6353, 2.5) -> (-112.75, 2.5)
  line L29 (-112.75, 2.5) -> (-112.75, 0)
  line L30 (-112.75, 0) -> (-115.75, 0)
  line L31 (-115.75, 0) -> (-115.75, 10)
  line L32 (-115.75, 10) -> (-125, 10)
  line L33 (-125, 10) -> (-125, -40)
  line L34 (-125, -40) -> (-115.75, -40)
  line L35 (-115.75, -40) -> (-115.75, -30)
  line L36 (-115.75, -30) -> (-112.75, -30)
  line L37 (-112.75, -30) -> (-112.75, -32.5)
  line L38 (-112.75, -32.5) -> (-111.7, -32.5)
  line L39 (-111.7, -32.5) -> (-111.7, -35.5)
  line L40 (-111.7, -35.5) -> (-112.75, -35.5)
  line L41 (-112.75, -35.5) -> (-112.75, -38)
  line L42 (-112.75, -38) -> (-107.25, -38)
  line L43 (-107.25, -38) -> (-107.25, -35.5)
  line L44 (-102.5, -15) -> (-131, -15) construction
  point P0 (-112.5, -15)
  dimension "d98" = 10
hole "Hole2" at (112.5, 15, 3) direction (0, 0, -1) diameter 5.3 depth 100 tip angle 118
